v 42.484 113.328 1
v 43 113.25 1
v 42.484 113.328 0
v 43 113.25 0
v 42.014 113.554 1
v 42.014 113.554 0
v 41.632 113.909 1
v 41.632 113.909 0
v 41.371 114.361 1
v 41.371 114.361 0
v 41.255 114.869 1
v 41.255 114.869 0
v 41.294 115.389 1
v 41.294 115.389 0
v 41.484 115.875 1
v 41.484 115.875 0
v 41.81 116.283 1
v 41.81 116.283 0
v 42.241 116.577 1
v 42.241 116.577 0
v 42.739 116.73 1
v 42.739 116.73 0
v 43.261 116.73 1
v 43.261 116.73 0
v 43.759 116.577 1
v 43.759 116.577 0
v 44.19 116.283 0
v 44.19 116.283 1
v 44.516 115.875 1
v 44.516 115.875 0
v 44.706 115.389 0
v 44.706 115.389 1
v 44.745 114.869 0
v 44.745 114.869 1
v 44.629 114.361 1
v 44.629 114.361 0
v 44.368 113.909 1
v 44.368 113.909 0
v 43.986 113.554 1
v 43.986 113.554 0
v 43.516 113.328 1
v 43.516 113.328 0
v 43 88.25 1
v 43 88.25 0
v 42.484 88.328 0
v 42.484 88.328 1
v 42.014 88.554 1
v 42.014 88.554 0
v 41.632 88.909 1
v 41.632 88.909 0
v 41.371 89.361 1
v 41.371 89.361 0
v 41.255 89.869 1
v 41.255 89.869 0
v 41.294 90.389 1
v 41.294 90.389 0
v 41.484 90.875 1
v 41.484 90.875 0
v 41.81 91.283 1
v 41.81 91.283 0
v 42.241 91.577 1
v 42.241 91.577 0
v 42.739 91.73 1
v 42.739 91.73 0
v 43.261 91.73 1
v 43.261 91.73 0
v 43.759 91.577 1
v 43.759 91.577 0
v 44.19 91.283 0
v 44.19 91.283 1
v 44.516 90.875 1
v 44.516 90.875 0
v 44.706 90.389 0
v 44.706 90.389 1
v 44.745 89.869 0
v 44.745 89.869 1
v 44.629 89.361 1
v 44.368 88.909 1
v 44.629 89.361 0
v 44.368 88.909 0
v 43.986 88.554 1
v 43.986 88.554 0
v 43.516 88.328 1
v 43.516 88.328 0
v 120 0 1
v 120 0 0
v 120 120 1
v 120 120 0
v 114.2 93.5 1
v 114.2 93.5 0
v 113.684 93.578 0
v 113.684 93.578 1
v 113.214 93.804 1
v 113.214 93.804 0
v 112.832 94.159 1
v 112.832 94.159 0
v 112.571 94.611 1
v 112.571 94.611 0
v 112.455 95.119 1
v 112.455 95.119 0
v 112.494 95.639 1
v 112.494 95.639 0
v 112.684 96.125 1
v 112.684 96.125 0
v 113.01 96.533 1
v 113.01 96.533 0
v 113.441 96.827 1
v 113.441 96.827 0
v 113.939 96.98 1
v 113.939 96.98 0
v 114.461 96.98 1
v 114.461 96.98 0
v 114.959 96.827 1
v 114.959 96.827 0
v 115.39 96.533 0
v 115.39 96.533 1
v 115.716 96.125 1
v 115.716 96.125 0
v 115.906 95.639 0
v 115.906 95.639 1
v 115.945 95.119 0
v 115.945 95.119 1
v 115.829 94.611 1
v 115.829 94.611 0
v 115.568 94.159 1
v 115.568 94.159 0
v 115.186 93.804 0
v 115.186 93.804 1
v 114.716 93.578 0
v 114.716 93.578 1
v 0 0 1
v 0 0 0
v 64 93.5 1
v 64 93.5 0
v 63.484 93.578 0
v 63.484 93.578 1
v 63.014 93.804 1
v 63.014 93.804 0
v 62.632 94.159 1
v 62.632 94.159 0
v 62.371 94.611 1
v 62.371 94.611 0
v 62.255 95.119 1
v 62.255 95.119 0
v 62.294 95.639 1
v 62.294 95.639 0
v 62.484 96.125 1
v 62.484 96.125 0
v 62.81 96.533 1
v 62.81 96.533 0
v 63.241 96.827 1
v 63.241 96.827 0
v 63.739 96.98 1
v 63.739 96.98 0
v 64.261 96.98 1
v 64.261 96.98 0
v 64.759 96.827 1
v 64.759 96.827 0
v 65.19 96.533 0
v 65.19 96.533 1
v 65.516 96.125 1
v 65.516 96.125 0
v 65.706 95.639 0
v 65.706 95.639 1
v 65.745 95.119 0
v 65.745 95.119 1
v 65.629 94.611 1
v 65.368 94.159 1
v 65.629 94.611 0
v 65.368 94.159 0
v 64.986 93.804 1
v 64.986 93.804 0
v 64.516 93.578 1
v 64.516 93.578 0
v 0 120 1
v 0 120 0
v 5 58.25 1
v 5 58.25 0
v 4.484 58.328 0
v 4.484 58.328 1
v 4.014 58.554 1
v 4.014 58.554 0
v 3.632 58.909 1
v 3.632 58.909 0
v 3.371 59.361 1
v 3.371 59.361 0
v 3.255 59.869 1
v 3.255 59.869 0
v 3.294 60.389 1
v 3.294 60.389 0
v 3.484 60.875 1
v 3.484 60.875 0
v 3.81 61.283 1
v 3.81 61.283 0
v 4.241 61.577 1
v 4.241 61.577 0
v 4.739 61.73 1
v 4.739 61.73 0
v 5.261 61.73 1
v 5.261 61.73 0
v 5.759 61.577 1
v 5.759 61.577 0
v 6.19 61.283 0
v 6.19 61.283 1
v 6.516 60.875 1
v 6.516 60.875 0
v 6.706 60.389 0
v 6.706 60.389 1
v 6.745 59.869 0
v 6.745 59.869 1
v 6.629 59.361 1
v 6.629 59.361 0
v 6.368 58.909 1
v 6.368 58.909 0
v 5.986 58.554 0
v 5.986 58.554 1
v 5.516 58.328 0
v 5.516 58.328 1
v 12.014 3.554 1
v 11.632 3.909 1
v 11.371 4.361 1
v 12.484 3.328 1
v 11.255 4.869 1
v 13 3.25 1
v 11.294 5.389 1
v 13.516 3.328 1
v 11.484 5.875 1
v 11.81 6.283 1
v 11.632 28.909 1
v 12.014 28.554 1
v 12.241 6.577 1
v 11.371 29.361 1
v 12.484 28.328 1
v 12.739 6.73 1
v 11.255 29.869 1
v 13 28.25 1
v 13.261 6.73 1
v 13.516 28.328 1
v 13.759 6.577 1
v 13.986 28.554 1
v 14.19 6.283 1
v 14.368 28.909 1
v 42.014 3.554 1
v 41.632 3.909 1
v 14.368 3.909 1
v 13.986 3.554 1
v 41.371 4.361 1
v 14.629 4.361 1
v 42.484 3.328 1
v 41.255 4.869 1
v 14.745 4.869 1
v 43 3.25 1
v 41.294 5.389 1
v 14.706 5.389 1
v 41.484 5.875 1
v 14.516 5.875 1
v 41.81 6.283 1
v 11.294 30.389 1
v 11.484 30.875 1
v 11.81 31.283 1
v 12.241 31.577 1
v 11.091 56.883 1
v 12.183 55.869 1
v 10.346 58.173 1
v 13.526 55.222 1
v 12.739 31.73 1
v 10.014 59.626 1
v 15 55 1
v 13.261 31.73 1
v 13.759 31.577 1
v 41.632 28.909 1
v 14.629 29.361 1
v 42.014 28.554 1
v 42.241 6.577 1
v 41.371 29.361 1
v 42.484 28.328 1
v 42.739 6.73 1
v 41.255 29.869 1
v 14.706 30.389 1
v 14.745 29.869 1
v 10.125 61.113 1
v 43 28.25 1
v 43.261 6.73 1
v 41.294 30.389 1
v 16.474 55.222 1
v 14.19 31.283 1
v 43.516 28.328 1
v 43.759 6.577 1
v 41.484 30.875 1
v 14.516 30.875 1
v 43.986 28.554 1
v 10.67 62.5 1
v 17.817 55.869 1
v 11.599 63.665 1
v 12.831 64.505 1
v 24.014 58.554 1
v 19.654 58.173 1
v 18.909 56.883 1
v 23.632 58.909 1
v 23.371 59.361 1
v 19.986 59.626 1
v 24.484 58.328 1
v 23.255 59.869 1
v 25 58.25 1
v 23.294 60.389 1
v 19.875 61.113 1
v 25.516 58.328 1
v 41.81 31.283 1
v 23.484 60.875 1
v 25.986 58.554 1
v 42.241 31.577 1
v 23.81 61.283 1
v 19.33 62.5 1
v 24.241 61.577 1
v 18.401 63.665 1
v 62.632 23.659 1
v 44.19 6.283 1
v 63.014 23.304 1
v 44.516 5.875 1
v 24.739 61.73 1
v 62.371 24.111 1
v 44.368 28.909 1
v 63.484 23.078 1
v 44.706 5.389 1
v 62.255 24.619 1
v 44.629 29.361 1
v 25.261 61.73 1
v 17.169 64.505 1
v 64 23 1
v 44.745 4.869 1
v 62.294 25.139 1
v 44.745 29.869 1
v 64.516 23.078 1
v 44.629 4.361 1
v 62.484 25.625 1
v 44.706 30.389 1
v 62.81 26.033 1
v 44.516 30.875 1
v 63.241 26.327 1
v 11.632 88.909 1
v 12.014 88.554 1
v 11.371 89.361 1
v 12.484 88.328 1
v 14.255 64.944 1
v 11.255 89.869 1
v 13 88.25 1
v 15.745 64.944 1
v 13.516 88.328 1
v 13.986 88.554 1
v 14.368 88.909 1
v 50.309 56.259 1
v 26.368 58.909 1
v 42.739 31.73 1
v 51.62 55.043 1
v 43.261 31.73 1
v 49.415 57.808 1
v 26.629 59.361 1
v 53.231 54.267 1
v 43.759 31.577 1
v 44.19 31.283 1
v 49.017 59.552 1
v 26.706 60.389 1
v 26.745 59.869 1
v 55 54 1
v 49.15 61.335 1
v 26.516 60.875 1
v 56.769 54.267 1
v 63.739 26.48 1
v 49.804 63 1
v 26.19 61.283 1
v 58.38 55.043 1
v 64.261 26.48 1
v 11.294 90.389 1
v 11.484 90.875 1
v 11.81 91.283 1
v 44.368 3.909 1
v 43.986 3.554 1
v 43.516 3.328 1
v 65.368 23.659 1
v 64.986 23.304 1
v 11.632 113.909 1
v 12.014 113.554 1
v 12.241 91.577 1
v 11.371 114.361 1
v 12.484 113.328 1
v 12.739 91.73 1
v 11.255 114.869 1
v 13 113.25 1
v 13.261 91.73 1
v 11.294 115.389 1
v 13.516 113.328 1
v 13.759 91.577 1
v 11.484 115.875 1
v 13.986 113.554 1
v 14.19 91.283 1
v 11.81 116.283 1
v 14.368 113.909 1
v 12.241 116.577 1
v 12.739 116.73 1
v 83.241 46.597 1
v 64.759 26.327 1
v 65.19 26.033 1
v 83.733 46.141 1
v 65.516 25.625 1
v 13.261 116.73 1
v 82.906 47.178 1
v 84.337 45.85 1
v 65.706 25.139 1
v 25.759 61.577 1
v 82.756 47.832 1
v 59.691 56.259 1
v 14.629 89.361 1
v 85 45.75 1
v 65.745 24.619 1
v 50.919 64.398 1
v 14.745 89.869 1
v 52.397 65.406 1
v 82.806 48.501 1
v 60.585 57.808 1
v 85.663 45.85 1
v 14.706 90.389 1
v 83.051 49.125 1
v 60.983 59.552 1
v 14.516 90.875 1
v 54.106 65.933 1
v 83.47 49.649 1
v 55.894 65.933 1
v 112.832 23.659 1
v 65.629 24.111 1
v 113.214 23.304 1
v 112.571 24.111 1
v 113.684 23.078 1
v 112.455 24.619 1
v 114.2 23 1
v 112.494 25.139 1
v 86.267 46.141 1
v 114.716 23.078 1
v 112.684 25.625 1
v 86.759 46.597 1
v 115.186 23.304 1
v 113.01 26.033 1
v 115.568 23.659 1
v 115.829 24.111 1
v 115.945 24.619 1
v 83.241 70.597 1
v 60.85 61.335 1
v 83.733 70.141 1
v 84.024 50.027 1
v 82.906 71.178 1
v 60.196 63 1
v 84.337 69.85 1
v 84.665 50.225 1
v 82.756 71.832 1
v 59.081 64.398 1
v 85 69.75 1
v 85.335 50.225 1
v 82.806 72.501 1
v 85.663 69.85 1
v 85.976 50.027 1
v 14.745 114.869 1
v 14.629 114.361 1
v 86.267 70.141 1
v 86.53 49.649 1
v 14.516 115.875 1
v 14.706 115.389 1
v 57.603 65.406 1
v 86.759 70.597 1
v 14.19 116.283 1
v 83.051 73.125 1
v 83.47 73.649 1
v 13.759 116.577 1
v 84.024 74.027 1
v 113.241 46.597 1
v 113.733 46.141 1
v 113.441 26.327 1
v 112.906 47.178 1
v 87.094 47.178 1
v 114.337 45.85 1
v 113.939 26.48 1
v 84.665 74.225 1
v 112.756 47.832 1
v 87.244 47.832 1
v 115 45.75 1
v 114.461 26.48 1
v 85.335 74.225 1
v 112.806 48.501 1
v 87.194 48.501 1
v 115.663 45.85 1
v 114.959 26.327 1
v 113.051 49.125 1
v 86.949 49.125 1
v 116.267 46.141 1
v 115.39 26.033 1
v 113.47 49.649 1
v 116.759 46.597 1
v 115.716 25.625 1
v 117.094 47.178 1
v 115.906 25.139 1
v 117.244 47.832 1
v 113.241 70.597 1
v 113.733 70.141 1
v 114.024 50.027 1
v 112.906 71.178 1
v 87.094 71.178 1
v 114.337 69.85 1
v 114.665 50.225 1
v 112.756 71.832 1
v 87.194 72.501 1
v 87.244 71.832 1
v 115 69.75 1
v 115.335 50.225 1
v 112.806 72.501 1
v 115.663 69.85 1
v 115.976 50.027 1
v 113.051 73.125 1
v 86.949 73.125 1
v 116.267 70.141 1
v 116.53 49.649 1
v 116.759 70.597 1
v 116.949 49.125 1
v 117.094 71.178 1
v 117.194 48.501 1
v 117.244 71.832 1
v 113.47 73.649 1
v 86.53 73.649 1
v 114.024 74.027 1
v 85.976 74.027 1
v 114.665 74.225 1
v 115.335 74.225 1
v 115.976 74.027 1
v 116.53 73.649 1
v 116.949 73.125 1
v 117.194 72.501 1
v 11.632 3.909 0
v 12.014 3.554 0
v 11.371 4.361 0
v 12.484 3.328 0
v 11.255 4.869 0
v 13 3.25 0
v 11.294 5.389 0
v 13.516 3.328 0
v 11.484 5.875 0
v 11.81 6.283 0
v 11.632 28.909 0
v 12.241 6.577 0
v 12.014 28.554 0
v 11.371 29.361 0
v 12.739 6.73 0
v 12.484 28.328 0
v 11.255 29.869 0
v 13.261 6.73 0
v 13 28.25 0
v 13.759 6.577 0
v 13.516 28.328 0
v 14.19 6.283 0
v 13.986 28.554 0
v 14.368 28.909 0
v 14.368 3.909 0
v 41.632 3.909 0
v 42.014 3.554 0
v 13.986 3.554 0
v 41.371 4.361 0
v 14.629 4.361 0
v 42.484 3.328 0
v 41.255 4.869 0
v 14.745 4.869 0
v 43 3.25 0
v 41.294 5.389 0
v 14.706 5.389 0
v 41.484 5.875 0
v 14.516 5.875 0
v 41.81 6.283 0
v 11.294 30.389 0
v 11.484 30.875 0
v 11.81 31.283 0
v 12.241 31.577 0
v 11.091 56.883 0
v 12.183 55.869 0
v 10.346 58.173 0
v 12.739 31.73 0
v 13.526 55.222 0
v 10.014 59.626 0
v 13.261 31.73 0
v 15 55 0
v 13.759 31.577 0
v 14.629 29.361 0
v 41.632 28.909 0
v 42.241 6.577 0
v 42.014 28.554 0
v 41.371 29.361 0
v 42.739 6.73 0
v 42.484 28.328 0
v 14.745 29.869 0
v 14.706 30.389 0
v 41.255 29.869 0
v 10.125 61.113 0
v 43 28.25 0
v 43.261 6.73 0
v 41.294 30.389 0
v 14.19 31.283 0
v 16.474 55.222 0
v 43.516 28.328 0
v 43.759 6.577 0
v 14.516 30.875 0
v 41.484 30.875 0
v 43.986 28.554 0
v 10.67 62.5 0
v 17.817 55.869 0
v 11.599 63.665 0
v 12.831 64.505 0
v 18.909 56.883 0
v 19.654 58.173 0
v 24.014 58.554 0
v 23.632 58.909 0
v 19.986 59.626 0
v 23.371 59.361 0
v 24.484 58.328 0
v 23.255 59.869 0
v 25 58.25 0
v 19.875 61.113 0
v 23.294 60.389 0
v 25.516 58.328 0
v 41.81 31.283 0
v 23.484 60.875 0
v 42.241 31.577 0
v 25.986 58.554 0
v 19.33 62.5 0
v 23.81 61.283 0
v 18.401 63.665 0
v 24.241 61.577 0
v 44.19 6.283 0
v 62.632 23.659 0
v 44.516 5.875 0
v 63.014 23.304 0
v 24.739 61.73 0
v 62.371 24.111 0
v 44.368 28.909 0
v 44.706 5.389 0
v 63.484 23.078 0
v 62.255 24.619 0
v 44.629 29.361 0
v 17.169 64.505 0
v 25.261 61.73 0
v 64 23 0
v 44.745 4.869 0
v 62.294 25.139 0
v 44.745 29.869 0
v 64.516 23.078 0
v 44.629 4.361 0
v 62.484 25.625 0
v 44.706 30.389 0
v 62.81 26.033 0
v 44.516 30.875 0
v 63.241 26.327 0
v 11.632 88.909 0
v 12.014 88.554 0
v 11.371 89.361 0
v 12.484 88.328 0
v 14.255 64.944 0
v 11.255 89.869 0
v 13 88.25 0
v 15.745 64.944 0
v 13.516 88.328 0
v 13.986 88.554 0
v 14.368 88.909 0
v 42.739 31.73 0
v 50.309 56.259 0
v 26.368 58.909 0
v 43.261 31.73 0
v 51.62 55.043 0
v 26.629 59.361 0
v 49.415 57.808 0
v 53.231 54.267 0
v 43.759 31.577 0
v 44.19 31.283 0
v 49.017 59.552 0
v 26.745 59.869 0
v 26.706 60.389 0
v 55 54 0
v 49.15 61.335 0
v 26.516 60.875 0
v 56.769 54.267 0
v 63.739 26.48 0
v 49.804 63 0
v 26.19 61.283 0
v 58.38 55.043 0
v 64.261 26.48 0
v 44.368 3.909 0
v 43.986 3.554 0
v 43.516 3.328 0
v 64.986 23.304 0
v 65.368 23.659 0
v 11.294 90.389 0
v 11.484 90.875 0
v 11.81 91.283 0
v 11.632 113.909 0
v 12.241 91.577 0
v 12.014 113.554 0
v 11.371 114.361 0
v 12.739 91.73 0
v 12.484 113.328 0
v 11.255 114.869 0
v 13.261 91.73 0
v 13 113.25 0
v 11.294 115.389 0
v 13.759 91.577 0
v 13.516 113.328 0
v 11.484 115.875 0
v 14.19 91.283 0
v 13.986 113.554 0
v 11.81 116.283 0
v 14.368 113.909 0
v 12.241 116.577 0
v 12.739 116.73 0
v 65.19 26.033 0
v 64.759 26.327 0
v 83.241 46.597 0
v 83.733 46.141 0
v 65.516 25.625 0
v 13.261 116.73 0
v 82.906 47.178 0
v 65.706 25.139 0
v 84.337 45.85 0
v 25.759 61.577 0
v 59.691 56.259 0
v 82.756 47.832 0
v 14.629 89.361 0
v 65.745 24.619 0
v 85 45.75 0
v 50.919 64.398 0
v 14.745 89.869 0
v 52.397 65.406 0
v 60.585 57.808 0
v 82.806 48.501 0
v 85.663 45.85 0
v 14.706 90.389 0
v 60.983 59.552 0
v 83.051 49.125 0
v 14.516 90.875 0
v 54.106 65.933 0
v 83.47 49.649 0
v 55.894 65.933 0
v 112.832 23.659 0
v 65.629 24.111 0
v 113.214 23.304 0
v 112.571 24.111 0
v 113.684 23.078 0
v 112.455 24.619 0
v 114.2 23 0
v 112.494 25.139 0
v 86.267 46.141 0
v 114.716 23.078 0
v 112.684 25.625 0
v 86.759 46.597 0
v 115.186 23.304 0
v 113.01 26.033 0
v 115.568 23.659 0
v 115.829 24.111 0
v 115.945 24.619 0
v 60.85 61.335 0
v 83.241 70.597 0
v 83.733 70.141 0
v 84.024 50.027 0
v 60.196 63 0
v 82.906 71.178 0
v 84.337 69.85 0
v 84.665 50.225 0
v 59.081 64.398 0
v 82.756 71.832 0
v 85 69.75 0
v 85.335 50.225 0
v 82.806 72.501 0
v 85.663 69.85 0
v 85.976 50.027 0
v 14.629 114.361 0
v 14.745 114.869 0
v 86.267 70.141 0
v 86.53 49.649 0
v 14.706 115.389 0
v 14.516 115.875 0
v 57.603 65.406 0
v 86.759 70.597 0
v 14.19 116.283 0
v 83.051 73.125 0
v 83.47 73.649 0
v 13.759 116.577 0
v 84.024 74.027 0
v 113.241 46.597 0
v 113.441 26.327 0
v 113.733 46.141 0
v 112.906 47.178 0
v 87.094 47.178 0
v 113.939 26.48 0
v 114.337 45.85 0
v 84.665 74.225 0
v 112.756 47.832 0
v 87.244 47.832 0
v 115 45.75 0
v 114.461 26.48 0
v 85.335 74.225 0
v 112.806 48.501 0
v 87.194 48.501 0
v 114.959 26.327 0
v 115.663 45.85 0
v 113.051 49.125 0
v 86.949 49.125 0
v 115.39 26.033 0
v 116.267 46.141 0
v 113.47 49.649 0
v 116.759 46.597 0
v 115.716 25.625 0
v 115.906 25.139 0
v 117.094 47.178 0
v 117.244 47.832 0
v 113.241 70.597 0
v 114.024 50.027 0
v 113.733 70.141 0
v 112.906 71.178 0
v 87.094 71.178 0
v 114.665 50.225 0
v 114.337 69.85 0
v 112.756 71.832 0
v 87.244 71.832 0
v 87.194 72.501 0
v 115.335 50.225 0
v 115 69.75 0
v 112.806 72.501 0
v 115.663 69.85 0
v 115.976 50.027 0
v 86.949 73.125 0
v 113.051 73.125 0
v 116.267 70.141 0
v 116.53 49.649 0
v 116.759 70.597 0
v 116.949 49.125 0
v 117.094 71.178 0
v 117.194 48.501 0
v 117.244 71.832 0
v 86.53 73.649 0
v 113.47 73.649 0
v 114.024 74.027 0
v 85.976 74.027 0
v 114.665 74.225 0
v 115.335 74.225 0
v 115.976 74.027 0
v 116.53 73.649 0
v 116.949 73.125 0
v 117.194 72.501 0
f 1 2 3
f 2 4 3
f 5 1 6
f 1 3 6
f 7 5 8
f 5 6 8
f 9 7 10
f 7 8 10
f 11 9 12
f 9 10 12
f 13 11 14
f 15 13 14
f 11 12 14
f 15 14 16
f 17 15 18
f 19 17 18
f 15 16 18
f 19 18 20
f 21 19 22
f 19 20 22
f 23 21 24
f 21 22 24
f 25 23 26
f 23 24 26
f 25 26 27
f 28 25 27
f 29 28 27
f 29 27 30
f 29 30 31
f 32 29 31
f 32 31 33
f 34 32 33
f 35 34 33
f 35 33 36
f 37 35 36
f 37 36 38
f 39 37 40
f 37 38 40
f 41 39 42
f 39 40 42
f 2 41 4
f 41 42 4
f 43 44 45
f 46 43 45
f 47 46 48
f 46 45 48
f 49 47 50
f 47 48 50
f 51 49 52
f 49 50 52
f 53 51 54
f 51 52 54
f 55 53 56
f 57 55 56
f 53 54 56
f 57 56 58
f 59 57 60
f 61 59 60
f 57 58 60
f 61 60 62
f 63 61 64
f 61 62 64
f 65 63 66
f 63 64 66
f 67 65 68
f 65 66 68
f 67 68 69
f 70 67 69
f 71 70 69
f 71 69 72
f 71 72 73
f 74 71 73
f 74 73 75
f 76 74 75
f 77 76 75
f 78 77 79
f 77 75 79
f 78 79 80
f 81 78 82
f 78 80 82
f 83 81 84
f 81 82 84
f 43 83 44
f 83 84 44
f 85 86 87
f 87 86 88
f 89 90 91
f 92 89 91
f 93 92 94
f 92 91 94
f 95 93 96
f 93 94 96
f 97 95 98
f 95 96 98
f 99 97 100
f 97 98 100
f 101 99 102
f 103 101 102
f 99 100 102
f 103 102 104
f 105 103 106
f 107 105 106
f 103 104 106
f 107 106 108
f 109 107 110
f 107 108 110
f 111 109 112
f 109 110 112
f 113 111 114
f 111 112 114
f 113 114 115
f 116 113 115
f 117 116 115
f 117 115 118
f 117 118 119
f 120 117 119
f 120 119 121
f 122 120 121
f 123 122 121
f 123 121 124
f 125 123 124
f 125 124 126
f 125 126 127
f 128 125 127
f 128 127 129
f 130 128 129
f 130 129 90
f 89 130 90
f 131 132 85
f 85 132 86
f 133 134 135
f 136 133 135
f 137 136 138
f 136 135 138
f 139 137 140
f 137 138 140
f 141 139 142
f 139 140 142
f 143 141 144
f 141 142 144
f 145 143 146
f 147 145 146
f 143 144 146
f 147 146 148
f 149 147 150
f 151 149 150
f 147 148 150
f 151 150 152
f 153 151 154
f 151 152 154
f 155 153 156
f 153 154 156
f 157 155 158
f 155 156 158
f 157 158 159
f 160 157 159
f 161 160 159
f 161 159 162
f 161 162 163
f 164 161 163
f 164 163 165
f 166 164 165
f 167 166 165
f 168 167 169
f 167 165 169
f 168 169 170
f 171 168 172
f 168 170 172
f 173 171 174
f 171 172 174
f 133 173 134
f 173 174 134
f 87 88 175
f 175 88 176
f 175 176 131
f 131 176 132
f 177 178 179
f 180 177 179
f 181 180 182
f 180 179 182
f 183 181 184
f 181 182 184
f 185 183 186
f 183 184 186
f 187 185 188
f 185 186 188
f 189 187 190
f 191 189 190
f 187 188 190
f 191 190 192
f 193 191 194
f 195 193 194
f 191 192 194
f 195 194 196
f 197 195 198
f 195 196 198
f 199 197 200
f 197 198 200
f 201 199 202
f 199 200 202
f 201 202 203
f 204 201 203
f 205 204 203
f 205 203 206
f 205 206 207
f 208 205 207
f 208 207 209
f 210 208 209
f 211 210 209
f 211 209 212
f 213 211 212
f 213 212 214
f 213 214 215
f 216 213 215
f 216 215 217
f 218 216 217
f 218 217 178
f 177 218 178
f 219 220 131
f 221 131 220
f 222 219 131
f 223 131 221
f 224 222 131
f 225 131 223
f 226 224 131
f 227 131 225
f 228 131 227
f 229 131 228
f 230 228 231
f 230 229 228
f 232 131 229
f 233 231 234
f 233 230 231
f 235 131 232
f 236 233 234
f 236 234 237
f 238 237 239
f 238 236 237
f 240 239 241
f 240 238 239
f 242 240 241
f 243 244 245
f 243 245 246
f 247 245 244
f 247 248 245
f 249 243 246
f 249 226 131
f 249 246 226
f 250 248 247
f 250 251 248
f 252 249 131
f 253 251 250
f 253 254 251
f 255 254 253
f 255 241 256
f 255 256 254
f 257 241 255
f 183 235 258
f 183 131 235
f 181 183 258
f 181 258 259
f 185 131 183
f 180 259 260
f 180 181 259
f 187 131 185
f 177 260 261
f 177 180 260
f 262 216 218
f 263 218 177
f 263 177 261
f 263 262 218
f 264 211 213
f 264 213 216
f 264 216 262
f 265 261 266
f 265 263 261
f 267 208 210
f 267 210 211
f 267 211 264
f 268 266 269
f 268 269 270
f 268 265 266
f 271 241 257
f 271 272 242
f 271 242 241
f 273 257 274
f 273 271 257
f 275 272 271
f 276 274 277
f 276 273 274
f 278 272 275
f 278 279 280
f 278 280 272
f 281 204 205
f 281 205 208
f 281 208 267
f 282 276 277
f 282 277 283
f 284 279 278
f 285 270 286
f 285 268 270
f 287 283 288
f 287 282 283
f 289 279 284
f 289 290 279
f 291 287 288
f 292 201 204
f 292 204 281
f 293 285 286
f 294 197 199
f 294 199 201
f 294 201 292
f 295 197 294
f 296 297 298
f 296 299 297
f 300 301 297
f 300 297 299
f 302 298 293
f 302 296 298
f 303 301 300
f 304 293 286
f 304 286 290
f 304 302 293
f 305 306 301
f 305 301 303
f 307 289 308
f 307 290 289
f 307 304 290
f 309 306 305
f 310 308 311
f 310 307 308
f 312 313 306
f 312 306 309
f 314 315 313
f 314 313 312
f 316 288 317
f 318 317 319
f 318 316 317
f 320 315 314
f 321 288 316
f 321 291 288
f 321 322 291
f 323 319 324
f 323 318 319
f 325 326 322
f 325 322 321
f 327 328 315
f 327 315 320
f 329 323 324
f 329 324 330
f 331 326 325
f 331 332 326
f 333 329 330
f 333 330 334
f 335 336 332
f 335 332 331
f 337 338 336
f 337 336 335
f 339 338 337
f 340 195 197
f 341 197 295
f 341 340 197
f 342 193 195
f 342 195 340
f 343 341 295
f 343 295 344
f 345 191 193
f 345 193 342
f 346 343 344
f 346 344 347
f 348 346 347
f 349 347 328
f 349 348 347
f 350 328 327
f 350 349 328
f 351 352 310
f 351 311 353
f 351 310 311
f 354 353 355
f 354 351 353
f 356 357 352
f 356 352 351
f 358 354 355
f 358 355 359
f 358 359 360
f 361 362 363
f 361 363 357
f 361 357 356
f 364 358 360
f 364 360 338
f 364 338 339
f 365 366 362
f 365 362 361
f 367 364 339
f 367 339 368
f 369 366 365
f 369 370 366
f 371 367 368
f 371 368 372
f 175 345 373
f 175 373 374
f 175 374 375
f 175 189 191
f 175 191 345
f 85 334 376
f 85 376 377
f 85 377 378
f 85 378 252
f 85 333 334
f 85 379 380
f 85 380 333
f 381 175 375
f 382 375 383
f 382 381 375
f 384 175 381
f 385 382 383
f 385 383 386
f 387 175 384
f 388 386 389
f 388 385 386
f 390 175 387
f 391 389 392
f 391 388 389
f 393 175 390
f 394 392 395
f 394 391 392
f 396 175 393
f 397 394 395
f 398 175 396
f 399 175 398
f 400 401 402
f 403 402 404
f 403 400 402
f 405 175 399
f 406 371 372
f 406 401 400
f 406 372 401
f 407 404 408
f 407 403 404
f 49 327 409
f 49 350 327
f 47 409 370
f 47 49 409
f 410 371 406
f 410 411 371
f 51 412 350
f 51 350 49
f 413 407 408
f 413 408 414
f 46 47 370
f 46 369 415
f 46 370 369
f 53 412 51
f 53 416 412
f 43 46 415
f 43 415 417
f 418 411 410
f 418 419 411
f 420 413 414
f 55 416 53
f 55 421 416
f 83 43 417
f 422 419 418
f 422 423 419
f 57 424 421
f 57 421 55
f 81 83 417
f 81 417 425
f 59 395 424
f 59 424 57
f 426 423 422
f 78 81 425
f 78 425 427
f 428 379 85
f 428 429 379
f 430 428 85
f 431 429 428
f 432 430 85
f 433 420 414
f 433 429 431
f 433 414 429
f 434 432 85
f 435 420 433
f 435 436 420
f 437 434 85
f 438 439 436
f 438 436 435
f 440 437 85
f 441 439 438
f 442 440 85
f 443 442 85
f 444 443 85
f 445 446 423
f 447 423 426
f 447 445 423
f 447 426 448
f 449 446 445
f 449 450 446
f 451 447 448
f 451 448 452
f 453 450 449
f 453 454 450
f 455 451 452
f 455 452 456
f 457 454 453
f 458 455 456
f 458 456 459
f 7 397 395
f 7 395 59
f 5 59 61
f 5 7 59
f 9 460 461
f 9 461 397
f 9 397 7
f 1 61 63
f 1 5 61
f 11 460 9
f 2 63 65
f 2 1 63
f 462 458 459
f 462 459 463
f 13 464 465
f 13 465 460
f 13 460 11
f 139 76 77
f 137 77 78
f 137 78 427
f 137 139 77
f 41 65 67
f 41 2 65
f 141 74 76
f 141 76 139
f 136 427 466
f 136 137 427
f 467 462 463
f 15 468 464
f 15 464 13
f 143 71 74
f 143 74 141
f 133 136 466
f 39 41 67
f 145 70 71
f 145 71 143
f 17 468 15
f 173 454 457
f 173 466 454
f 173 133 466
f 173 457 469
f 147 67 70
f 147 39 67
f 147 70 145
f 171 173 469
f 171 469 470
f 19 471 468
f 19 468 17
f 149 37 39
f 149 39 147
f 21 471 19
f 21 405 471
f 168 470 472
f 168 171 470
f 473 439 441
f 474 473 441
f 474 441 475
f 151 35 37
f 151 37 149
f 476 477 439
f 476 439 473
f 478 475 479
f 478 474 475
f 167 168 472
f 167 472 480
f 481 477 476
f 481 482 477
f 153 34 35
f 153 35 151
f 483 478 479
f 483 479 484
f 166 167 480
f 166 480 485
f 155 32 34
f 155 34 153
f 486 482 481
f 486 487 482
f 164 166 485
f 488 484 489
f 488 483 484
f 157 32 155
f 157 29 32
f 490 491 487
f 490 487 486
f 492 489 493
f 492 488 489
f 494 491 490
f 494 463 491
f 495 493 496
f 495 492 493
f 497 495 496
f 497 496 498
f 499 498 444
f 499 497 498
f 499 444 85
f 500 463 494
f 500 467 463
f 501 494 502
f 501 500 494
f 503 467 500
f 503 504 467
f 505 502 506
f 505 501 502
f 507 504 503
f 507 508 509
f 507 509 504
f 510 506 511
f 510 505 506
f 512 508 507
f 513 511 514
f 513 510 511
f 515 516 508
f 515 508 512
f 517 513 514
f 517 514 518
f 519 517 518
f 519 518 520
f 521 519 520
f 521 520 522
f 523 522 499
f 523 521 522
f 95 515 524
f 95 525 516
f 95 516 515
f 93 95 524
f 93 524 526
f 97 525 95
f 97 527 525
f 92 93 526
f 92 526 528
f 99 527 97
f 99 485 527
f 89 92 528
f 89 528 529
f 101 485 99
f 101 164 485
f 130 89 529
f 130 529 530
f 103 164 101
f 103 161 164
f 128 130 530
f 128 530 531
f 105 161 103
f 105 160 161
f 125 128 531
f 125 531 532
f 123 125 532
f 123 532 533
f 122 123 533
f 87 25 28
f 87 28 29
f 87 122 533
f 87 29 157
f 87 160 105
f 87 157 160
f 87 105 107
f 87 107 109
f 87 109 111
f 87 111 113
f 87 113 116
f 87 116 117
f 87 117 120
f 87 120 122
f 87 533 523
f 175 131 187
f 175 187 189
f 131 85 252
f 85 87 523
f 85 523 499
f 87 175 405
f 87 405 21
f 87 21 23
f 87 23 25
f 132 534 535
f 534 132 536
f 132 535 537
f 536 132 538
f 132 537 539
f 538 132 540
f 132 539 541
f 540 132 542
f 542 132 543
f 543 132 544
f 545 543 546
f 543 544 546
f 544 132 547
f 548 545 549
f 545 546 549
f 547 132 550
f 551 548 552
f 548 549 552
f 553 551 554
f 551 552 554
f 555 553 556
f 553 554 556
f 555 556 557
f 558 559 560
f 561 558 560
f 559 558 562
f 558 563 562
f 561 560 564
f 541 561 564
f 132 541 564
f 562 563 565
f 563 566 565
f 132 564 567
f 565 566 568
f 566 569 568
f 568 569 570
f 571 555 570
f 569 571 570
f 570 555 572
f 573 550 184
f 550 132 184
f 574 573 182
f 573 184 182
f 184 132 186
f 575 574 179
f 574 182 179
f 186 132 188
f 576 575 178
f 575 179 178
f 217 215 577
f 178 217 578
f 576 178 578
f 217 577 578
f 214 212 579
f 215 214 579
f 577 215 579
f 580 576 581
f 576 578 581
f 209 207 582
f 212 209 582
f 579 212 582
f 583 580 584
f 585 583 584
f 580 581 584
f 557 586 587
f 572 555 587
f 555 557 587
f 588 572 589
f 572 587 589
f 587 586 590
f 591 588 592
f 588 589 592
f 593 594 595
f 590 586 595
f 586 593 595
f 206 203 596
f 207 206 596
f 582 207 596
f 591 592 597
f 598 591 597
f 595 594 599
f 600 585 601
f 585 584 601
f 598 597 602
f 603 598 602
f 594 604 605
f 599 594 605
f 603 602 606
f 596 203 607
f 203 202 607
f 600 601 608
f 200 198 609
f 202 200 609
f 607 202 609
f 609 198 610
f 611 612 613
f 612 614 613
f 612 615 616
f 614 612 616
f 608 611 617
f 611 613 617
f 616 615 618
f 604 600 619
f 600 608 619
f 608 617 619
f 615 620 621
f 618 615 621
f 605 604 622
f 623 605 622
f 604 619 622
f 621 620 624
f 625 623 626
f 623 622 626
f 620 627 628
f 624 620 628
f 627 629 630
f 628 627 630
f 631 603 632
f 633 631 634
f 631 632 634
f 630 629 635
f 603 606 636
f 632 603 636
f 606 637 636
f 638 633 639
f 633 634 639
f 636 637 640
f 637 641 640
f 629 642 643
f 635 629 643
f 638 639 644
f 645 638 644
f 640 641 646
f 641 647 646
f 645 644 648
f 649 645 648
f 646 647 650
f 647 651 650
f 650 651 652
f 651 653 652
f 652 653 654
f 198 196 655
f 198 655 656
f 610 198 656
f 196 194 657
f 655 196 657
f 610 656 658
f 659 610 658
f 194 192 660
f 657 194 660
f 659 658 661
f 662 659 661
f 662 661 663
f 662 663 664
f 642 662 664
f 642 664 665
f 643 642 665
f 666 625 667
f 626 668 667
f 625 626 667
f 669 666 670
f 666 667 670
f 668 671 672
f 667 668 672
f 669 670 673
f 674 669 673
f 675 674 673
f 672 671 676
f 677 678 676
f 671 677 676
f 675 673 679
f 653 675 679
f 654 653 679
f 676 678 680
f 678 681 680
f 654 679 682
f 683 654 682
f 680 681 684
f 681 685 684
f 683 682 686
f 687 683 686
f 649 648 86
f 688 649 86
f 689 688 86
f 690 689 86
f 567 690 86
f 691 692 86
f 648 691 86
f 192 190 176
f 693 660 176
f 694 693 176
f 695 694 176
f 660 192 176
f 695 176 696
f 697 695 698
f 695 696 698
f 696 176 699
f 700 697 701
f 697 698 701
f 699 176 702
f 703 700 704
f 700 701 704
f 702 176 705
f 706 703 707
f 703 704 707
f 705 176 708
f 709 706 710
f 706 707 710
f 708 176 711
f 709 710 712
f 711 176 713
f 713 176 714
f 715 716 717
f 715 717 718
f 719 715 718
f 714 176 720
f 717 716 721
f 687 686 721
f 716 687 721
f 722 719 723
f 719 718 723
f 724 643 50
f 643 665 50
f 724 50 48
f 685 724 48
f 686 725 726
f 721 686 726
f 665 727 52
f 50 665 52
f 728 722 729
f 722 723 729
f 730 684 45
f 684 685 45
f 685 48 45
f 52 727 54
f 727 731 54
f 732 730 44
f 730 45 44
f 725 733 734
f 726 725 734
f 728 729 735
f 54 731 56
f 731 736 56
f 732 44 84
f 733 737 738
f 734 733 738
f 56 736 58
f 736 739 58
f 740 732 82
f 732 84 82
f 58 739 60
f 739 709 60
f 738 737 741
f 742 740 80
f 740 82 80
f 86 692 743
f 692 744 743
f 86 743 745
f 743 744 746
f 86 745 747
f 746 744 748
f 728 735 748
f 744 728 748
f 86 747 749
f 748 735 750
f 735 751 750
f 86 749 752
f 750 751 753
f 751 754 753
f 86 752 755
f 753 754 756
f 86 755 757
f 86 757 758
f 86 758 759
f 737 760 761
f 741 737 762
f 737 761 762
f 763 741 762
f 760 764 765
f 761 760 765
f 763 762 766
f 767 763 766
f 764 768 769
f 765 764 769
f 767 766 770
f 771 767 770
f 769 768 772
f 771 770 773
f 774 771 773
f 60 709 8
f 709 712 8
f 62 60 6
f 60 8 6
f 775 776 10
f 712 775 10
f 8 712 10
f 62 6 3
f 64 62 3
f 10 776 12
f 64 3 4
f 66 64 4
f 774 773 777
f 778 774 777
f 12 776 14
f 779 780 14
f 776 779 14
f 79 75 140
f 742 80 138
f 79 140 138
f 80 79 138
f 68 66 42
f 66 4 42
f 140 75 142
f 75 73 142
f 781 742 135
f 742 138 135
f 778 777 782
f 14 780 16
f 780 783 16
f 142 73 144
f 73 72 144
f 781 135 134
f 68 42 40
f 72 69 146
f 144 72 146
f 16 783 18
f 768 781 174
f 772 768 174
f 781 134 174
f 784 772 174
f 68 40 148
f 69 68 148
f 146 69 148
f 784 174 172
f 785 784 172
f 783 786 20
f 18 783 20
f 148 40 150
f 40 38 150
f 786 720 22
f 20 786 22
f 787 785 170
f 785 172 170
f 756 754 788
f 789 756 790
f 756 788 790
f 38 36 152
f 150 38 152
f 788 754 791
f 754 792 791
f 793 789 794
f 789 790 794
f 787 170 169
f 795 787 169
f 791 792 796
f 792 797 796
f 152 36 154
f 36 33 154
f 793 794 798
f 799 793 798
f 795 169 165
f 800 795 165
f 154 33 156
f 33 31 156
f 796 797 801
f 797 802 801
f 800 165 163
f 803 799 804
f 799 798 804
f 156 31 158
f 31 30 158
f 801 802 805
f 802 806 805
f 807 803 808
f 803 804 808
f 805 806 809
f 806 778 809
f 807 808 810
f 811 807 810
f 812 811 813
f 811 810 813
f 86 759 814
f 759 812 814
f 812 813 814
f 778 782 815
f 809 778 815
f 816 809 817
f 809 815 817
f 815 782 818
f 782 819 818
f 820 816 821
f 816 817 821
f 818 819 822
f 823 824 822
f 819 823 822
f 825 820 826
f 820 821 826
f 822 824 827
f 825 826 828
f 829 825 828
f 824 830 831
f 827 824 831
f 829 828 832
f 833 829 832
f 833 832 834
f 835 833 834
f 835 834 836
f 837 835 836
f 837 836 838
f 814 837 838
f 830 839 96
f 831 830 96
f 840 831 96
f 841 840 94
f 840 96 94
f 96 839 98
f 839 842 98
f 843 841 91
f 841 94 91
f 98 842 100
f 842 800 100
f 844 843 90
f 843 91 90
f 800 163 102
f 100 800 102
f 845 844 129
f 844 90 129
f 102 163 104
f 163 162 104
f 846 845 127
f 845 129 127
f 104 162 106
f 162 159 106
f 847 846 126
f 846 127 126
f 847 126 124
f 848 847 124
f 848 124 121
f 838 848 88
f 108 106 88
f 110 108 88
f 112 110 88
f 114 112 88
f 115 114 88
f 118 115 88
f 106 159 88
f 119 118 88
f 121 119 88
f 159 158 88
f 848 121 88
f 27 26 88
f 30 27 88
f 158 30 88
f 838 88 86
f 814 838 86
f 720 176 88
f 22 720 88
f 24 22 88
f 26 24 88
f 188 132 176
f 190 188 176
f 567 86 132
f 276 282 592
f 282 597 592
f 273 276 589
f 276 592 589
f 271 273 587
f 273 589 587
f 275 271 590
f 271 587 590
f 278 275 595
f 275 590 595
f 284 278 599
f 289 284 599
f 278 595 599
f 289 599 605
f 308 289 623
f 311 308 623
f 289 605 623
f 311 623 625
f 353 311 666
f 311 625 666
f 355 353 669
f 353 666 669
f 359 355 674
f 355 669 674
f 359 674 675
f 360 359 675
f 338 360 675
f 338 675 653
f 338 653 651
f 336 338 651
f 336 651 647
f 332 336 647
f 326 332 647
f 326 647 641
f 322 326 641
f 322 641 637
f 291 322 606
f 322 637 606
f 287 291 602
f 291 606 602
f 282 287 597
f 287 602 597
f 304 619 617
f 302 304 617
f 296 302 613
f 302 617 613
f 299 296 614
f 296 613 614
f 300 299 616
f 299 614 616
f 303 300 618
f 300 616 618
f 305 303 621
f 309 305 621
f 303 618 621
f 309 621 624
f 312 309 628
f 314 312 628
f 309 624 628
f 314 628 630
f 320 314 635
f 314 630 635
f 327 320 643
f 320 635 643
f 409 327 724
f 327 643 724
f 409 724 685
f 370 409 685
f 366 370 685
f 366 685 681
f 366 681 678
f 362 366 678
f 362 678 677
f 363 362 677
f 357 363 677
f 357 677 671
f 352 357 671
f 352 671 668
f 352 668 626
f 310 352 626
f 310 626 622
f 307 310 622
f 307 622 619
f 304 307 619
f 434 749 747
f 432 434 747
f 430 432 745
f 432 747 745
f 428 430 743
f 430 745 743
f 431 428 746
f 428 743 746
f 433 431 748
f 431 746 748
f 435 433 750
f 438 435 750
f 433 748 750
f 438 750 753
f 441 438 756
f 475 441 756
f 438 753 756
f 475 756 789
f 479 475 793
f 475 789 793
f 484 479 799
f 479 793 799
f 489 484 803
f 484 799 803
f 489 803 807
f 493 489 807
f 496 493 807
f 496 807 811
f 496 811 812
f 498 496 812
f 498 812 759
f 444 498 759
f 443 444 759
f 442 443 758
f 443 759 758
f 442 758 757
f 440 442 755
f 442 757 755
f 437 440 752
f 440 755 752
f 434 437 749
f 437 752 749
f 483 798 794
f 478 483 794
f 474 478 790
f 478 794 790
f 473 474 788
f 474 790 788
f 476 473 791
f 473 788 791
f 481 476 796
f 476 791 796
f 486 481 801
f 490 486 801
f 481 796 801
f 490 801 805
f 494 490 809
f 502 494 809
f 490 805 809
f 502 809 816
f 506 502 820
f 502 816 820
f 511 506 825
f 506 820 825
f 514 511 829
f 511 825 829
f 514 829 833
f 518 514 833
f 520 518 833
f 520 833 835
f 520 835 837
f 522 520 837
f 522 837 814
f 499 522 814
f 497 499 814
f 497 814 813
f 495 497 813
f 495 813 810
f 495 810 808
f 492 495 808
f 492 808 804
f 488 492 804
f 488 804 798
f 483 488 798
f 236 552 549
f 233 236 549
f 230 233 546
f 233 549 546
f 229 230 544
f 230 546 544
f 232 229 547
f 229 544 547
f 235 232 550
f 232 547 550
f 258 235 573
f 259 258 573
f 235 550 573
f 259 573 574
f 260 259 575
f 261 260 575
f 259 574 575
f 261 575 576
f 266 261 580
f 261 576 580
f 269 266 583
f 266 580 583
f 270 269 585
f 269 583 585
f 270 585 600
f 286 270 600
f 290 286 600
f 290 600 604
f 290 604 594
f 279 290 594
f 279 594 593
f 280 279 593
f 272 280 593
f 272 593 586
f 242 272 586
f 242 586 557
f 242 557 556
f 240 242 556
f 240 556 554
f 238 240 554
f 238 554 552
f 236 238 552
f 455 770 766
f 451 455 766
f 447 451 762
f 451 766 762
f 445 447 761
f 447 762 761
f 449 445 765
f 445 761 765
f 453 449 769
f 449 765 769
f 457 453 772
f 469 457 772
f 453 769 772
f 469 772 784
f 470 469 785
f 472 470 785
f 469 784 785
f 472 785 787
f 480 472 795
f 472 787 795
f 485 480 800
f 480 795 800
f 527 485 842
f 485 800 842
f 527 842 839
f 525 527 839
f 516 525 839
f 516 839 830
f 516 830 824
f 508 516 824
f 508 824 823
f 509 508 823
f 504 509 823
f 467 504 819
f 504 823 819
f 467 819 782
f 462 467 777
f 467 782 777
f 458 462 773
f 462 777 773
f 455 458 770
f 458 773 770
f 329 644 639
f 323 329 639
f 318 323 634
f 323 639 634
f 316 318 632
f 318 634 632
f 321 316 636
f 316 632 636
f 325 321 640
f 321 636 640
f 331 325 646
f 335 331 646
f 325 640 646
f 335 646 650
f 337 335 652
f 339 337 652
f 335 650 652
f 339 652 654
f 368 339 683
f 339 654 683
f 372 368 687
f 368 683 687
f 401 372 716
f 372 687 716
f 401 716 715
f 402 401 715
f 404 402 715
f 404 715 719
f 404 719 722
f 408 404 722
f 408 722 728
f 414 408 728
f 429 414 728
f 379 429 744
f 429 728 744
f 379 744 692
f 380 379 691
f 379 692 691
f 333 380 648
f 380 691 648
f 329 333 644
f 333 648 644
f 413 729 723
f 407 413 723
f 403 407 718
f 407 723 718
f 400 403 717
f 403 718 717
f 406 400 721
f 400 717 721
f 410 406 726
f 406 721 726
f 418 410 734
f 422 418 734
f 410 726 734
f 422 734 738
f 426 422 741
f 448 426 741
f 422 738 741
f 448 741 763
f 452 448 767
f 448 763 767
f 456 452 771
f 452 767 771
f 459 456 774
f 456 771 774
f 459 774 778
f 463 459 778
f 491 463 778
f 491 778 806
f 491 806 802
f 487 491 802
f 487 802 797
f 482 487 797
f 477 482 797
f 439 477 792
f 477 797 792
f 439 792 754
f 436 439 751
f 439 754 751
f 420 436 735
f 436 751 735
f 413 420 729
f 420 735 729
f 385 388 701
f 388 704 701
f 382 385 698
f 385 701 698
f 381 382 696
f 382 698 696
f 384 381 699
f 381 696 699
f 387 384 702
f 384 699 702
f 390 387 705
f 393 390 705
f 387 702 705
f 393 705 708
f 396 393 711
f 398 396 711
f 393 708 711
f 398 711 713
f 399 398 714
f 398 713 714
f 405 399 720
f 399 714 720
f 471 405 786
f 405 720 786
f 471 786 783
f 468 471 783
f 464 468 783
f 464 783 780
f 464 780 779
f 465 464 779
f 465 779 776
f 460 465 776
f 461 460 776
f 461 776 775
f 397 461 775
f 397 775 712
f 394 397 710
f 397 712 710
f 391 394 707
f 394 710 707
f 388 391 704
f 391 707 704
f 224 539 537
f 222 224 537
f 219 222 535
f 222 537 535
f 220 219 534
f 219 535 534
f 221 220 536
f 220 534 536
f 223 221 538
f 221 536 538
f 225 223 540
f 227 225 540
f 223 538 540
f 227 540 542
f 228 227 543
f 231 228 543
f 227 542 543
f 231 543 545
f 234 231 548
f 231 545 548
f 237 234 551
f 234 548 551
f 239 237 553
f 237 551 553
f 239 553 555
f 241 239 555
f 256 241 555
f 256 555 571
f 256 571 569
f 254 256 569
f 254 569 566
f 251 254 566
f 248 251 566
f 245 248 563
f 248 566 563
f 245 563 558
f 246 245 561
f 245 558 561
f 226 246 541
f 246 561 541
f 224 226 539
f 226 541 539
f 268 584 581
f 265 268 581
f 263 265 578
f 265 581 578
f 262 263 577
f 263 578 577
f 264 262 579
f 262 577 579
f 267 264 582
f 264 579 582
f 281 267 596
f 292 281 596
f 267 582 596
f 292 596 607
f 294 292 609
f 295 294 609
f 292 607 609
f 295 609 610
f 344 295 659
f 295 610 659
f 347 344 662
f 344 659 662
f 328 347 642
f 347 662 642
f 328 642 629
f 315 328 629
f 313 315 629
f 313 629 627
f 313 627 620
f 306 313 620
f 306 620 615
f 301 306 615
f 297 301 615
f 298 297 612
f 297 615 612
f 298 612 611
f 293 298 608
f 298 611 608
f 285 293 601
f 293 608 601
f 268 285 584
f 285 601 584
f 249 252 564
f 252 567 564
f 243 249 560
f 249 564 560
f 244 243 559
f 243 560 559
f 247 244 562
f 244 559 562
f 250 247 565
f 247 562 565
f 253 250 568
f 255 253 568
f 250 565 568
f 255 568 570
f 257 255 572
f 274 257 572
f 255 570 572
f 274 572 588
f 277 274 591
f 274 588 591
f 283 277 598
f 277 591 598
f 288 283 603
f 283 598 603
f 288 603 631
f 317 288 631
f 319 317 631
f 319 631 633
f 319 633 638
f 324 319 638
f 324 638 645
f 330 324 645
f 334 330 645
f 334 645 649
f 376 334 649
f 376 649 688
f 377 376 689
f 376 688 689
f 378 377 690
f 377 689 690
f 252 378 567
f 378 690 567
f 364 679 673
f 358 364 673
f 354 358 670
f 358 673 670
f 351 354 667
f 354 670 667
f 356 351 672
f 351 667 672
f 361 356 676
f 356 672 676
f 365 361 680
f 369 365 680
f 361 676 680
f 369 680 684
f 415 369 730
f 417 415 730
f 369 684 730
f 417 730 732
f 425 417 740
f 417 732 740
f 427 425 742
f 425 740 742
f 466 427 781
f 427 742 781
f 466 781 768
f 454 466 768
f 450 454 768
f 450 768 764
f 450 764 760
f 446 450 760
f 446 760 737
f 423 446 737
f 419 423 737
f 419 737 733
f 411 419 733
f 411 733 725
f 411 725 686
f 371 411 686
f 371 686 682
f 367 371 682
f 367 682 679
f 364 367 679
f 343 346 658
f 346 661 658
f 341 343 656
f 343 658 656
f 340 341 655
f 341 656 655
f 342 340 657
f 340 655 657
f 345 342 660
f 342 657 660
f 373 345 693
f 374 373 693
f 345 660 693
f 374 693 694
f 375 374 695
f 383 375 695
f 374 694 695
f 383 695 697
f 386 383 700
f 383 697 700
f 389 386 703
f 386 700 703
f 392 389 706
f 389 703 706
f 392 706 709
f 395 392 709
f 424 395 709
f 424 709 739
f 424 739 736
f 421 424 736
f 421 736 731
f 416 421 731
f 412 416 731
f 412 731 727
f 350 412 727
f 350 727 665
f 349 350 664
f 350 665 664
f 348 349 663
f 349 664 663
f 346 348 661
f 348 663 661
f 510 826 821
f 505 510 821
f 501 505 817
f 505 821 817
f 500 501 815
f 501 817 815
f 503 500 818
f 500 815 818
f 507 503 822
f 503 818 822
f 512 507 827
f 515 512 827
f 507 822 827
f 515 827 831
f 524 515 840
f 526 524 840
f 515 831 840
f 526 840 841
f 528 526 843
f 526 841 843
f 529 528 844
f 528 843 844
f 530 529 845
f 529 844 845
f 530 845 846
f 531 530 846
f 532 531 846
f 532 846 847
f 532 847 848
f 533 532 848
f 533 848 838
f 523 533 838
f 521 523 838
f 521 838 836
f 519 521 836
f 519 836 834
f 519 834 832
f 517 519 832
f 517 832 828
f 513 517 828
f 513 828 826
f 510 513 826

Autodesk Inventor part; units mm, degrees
ref_plane "YZ Plane" through (0, 0, 0) normal (1, 0, 0) x (0, 1, 0)
ref_plane "XZ Plane" through (0, 0, 0) normal (0, 1, 0) x (-1, 0, 0)
ref_plane "XY Plane" through (0, 0, 0) normal (0, 0, 1) x (1, 0, 0)
sketch "スケッチ1" plane through (0, 0, 0) normal (0, 0, 1) x (1, 0, 0)
  line L0 (0, 0) -> (120, 0)
  line L1 (120, 0) -> (120, 120)
  line L2 (120, 120) -> (0, 120)
  line L3 (0, 120) -> (0, 0)
  dimension "d1" = 120
  dimension "d2" = 120
extrude "押し出し1" add sketch "スケッチ1" along normal blind 1
sketch "スケッチ2" plane through (0, 0, 1) normal (0, 0, 1) x (1, 0, 0)
  line L0 (0, 120) -> (0, 0) projected
  line L1 (0, 60) -> (120, 60) construction
  line L2 (120, 0) -> (120, 120) projected
  line L3 (120, 120) -> (0, 120) projected
  point P0 (13, 115)
  point P1 (13, 90)
  point P2 (43, 115)
  point P3 (43, 90)
  dimension "d8" = 13
  dimension "d9" = 5
  dimension "d12" = 25
  dimension "d15" = 30
hole "穴1" at (13, 115, 1) at (13, 90, 1) at (43, 115, 1) at (43, 90, 1) direction (0, 0, -1) diameter 3.5 end through all
sketch "スケッチ3" plane through (0, 0, 1) normal (0, 0, 1) x (1, 0, 0)
  line L0 (0, 120) -> (0, 0) projected
  line L1 (0, 0) -> (120, 0) projected
  point P0 (13, 5)
  point P1 (43, 5)
  point P2 (13, 30)
  point P3 (43, 30)
  dimension "d25" = 13
  dimension "d26" = 5
  dimension "d29" = 30
  dimension "d32" = 25
hole "穴2" at (13, 5, 1) at (43, 5, 1) at (13, 30, 1) at (43, 30, 1) direction (0, 0, -1) diameter 3.5 end through all
sketch "スケッチ4" plane through (0, 0, 1) normal (0, 0, 1) x (1, 0, 0)
  line L0 (0, 120) -> (0, 0) projected
  line L1 (0, 60) -> (120, 60) construction
  line L2 (120, 0) -> (120, 120) projected
  line L3 (120, 120) -> (0, 120) projected
  point P0 (5, 60)
  point P1 (25, 60)
  dimension "d42" = 5
  dimension "d43" = 60
  dimension "d46" = 20
hole "穴3" at (5, 60, 1) at (25, 60, 1) direction (0, 0, -1) diameter 3.5 end through all
sketch "スケッチ5" plane through (0, 0, 1) normal (0, 0, 1) x (1, 0, 0)
  line L0 (0, 120) -> (0, 0) projected
  line L1 (120, 120) -> (0, 120) projected
  point P0 (15, 60)
  dimension "d58" = 15
  dimension "d59" = 60
hole "穴4" at (15, 60, 1) direction (0, 0, -1) diameter 10 end through all
sketch "スケッチ6" plane through (0, 0, 1) normal (0, 0, 1) x (1, 0, 0)
  line L0 (0, 120) -> (0, 0) projected
  line L1 (120, 120) -> (0, 120) projected
  point P0 (55, 60)
  dimension "d67" = 55
  dimension "d68" = 60
hole "穴5" at (55, 60, 1) direction (0, 0, -1) diameter 12 end through all
sketch "スケッチ7" plane through (0, 0, 1) normal (0, 0, 1) x (1, 0, 0)
  line L0 (0, 120) -> (0, 0) projected
  line L1 (0, 60) -> (120, 60) construction
  line L2 (120, 0) -> (120, 120) projected
  line L3 (120, 120) -> (0, 120) projected
  point P0 (64, 95.25)
  point P1 (64, 24.75)
  point P2 (114.2, 95.25)
  point P3 (114.2, 24.75)
  dimension "d76" = 64
  dimension "d77" = 24.75
  dimension "d80" = 70.5
  dimension "d83" = 50.2
hole "穴6" at (64, 95.25, 1) at (64, 24.75, 1) at (114.2, 95.25, 1) at (114.2, 24.75, 1) direction (0, 0, -1) diameter 3.5 end through all
sketch "スケッチ8" plane through (0, 0, 1) normal (0, 0, 1) x (1, 0, 0)
  line L0 (0, 120) -> (0, 0) projected
  line L1 (120, 120) -> (0, 120) projected
  point P0 (85, 72)
  point P1 (85, 48)
  point P2 (115, 72)
  point P3 (115, 48)
  dimension "d93" = 85
  dimension "d94" = 48
  dimension "d97" = 24
  dimension "d100" = 30
hole "穴7" at (85, 72, 1) at (85, 48, 1) at (115, 72, 1) at (115, 48, 1) direction (0, 0, -1) diameter 4.5 end through all
properties part number "RD002"
